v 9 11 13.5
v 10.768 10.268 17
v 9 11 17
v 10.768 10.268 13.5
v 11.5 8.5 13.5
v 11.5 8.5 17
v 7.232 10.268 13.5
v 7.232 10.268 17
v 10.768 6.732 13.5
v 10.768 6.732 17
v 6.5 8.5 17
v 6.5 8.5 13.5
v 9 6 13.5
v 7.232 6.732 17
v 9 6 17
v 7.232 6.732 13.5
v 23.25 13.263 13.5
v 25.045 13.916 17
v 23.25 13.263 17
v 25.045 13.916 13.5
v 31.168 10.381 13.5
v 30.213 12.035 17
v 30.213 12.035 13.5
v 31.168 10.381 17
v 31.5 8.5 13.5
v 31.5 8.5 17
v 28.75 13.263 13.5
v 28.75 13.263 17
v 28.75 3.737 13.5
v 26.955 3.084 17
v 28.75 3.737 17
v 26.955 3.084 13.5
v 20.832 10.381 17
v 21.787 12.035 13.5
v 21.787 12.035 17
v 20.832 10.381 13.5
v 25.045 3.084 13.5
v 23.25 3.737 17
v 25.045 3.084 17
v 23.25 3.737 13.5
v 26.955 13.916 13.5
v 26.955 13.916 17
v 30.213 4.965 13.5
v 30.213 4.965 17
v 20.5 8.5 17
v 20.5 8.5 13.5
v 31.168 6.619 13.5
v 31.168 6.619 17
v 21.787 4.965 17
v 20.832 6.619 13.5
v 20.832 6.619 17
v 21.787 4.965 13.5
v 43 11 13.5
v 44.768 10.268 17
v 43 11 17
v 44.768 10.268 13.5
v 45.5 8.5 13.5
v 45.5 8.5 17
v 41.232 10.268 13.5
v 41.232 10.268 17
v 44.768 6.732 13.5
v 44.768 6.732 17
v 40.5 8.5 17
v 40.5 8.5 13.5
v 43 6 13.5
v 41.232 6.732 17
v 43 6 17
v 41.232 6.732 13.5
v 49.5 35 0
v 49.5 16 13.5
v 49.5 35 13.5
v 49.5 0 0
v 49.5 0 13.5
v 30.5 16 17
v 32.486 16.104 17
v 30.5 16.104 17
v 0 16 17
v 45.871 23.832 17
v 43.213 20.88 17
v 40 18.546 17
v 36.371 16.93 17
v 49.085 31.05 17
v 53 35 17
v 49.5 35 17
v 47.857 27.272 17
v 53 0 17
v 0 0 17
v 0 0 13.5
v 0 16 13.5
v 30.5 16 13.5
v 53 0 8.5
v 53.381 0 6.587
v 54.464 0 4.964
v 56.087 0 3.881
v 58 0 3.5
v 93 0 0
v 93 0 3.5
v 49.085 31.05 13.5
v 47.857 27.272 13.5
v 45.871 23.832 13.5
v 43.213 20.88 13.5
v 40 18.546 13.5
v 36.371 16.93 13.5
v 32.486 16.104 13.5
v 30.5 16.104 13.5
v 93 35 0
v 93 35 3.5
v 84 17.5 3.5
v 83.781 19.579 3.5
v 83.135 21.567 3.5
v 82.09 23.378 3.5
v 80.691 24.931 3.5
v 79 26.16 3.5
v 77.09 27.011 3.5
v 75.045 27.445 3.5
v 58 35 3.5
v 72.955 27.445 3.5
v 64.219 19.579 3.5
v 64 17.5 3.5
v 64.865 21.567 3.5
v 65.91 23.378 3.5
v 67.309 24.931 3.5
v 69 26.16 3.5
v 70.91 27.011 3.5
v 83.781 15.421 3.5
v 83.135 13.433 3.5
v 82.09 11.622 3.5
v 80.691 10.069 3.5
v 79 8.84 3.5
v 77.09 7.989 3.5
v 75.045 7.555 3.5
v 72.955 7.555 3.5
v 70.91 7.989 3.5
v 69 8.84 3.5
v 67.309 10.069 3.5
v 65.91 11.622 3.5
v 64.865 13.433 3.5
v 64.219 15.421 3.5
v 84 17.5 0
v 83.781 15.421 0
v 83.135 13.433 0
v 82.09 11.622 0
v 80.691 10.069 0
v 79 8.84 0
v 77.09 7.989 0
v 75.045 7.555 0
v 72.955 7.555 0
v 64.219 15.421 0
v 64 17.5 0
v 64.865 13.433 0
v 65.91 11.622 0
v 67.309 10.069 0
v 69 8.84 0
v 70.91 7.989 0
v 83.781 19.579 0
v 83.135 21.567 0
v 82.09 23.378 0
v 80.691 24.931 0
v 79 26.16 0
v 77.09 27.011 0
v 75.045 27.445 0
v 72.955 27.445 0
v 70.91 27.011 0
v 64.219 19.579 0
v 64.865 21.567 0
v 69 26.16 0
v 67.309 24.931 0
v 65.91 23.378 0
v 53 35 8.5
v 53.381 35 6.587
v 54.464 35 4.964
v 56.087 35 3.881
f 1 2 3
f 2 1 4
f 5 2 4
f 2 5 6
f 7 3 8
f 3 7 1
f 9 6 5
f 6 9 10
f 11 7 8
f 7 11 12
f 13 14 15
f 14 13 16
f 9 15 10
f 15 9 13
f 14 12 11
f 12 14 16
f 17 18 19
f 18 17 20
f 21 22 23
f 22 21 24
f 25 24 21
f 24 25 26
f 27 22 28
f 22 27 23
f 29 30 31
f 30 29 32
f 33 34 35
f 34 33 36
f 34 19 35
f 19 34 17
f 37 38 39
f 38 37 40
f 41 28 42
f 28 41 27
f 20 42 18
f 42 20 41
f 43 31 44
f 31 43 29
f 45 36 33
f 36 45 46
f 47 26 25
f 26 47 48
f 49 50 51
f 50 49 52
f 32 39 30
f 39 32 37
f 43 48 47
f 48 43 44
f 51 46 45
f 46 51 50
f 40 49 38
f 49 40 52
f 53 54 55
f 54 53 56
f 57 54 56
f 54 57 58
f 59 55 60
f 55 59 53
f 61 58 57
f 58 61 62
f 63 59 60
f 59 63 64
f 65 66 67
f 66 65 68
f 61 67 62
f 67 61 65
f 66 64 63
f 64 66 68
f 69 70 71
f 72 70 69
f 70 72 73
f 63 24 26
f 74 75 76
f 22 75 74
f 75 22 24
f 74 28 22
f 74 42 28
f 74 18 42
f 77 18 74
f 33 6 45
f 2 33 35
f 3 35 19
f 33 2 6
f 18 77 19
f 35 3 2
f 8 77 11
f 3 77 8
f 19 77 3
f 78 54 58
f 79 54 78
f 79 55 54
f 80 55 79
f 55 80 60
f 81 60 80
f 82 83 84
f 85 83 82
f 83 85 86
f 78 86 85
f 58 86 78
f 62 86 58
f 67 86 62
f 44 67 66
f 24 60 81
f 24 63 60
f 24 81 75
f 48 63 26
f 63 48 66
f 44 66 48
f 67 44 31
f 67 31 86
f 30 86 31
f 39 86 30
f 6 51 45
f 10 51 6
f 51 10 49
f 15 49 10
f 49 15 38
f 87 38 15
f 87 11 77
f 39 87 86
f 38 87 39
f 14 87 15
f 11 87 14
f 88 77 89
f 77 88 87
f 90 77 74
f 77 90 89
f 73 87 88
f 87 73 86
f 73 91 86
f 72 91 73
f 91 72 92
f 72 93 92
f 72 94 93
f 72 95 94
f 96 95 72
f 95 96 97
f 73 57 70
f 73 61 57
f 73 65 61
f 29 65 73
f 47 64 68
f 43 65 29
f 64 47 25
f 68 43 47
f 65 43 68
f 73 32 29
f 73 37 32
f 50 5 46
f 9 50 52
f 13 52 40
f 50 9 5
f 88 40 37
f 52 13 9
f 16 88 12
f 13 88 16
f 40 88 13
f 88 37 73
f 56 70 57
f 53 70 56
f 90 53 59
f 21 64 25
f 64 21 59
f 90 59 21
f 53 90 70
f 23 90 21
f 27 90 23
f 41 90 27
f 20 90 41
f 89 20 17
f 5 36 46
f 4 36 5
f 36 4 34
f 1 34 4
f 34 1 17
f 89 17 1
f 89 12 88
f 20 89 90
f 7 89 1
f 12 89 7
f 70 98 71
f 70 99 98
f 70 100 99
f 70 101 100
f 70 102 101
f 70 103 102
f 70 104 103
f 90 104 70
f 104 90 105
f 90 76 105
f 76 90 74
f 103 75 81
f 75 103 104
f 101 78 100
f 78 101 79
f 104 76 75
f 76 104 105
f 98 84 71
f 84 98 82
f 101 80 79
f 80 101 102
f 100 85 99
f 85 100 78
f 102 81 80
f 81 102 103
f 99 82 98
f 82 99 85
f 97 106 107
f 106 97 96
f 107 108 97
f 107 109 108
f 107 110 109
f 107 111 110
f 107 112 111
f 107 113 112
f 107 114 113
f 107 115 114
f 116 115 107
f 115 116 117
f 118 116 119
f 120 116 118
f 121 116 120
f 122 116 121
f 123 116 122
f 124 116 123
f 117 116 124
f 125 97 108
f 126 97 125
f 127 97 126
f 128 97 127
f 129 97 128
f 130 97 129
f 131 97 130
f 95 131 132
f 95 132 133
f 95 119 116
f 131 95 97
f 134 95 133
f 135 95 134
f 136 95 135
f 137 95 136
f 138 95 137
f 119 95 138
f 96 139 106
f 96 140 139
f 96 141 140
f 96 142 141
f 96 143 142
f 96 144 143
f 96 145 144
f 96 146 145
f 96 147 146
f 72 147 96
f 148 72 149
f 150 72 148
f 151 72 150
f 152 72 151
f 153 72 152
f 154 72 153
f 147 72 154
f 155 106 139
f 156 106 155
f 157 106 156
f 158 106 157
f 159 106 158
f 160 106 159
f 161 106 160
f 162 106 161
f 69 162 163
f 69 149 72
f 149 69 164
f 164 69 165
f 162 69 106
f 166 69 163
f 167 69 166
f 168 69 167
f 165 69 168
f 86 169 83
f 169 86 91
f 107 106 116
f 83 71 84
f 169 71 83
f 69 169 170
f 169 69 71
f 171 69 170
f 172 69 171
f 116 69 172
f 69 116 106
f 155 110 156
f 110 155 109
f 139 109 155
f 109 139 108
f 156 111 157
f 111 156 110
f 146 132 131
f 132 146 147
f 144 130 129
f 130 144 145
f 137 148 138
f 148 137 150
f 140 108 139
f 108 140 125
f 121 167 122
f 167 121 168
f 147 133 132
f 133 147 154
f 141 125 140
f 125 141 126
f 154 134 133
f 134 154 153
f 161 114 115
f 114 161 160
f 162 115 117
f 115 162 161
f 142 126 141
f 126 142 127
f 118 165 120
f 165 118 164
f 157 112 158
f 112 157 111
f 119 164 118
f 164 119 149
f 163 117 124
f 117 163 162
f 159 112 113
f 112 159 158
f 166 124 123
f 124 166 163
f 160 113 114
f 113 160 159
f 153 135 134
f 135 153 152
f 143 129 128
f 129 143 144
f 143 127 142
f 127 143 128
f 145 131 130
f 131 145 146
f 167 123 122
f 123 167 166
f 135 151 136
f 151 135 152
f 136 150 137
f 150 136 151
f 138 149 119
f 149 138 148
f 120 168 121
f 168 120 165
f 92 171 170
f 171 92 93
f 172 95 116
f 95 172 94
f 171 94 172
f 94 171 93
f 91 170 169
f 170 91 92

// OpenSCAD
thickness = 3.5;
mountHeight = 10;
mountLargeHole = 11;
mountSmallHole = 5;
mountDistanceBtwHoles = 9;
probeDiameter = 20;
mountLength = 49.5;

module holes() {
    distance1 = 3 + mountSmallHole / 2;
    translate([distance1, 0, 0])
    cylinder(100, mountSmallHole / 2, mountSmallHole / 2);
    
    distance2 = distance1 + mountSmallHole / 2 + mountDistanceBtwHoles + mountLargeHole / 2;
    
    translate([distance2, 0, 0])
    cylinder(100, mountLargeHole / 2, mountLargeHole / 2);
    
    distance3 = distance2 + mountLargeHole / 2 + mountDistanceBtwHoles + mountSmallHole / 2;
    
    translate([distance3, 0, 0])
    cylinder(100, mountSmallHole / 2, mountSmallHole / 2);
}

/**
* mount
**/
difference() {
    difference() {
        cube([mountLength, 3 + mountLargeHole + 2, (thickness * 2) + mountHeight]);
        translate([thickness, 3 + mountLargeHole / 2, 0])
        holes();
    }
    cube([mountLength, 50, mountHeight + thickness]);
}

/**
* Radius
**/
difference() {
    translate([mountLength - 19, 16, mountHeight + thickness])
#    cube([19, 19, thickness]);
    translate([mountLength - 19, 35, mountHeight + thickness])
    cylinder(100, 19, 19);
}
    
/**
* Wall
*/
translate([mountLength, 0, 0])
cube([thickness, 35, mountHeight + thickness * 2]);

/**
* probe
**/
translate([mountLength + thickness, 0, 0])
group() {
    difference() {
        cube([40, 35, thickness]);
        translate([21, 17.5, 0])
        cylinder(100, probeDiameter / 2, probeDiameter / 2, 0, 0);
    }

    /**
    * radius
    **/
    difference() {
        translate([0, 0, thickness])
        cube([5, 35, 5]);
        translate([5, 0, thickness + 5]) 
        rotate([-90, 0, 0])
        cylinder(35, 5, 5);
    }
}
